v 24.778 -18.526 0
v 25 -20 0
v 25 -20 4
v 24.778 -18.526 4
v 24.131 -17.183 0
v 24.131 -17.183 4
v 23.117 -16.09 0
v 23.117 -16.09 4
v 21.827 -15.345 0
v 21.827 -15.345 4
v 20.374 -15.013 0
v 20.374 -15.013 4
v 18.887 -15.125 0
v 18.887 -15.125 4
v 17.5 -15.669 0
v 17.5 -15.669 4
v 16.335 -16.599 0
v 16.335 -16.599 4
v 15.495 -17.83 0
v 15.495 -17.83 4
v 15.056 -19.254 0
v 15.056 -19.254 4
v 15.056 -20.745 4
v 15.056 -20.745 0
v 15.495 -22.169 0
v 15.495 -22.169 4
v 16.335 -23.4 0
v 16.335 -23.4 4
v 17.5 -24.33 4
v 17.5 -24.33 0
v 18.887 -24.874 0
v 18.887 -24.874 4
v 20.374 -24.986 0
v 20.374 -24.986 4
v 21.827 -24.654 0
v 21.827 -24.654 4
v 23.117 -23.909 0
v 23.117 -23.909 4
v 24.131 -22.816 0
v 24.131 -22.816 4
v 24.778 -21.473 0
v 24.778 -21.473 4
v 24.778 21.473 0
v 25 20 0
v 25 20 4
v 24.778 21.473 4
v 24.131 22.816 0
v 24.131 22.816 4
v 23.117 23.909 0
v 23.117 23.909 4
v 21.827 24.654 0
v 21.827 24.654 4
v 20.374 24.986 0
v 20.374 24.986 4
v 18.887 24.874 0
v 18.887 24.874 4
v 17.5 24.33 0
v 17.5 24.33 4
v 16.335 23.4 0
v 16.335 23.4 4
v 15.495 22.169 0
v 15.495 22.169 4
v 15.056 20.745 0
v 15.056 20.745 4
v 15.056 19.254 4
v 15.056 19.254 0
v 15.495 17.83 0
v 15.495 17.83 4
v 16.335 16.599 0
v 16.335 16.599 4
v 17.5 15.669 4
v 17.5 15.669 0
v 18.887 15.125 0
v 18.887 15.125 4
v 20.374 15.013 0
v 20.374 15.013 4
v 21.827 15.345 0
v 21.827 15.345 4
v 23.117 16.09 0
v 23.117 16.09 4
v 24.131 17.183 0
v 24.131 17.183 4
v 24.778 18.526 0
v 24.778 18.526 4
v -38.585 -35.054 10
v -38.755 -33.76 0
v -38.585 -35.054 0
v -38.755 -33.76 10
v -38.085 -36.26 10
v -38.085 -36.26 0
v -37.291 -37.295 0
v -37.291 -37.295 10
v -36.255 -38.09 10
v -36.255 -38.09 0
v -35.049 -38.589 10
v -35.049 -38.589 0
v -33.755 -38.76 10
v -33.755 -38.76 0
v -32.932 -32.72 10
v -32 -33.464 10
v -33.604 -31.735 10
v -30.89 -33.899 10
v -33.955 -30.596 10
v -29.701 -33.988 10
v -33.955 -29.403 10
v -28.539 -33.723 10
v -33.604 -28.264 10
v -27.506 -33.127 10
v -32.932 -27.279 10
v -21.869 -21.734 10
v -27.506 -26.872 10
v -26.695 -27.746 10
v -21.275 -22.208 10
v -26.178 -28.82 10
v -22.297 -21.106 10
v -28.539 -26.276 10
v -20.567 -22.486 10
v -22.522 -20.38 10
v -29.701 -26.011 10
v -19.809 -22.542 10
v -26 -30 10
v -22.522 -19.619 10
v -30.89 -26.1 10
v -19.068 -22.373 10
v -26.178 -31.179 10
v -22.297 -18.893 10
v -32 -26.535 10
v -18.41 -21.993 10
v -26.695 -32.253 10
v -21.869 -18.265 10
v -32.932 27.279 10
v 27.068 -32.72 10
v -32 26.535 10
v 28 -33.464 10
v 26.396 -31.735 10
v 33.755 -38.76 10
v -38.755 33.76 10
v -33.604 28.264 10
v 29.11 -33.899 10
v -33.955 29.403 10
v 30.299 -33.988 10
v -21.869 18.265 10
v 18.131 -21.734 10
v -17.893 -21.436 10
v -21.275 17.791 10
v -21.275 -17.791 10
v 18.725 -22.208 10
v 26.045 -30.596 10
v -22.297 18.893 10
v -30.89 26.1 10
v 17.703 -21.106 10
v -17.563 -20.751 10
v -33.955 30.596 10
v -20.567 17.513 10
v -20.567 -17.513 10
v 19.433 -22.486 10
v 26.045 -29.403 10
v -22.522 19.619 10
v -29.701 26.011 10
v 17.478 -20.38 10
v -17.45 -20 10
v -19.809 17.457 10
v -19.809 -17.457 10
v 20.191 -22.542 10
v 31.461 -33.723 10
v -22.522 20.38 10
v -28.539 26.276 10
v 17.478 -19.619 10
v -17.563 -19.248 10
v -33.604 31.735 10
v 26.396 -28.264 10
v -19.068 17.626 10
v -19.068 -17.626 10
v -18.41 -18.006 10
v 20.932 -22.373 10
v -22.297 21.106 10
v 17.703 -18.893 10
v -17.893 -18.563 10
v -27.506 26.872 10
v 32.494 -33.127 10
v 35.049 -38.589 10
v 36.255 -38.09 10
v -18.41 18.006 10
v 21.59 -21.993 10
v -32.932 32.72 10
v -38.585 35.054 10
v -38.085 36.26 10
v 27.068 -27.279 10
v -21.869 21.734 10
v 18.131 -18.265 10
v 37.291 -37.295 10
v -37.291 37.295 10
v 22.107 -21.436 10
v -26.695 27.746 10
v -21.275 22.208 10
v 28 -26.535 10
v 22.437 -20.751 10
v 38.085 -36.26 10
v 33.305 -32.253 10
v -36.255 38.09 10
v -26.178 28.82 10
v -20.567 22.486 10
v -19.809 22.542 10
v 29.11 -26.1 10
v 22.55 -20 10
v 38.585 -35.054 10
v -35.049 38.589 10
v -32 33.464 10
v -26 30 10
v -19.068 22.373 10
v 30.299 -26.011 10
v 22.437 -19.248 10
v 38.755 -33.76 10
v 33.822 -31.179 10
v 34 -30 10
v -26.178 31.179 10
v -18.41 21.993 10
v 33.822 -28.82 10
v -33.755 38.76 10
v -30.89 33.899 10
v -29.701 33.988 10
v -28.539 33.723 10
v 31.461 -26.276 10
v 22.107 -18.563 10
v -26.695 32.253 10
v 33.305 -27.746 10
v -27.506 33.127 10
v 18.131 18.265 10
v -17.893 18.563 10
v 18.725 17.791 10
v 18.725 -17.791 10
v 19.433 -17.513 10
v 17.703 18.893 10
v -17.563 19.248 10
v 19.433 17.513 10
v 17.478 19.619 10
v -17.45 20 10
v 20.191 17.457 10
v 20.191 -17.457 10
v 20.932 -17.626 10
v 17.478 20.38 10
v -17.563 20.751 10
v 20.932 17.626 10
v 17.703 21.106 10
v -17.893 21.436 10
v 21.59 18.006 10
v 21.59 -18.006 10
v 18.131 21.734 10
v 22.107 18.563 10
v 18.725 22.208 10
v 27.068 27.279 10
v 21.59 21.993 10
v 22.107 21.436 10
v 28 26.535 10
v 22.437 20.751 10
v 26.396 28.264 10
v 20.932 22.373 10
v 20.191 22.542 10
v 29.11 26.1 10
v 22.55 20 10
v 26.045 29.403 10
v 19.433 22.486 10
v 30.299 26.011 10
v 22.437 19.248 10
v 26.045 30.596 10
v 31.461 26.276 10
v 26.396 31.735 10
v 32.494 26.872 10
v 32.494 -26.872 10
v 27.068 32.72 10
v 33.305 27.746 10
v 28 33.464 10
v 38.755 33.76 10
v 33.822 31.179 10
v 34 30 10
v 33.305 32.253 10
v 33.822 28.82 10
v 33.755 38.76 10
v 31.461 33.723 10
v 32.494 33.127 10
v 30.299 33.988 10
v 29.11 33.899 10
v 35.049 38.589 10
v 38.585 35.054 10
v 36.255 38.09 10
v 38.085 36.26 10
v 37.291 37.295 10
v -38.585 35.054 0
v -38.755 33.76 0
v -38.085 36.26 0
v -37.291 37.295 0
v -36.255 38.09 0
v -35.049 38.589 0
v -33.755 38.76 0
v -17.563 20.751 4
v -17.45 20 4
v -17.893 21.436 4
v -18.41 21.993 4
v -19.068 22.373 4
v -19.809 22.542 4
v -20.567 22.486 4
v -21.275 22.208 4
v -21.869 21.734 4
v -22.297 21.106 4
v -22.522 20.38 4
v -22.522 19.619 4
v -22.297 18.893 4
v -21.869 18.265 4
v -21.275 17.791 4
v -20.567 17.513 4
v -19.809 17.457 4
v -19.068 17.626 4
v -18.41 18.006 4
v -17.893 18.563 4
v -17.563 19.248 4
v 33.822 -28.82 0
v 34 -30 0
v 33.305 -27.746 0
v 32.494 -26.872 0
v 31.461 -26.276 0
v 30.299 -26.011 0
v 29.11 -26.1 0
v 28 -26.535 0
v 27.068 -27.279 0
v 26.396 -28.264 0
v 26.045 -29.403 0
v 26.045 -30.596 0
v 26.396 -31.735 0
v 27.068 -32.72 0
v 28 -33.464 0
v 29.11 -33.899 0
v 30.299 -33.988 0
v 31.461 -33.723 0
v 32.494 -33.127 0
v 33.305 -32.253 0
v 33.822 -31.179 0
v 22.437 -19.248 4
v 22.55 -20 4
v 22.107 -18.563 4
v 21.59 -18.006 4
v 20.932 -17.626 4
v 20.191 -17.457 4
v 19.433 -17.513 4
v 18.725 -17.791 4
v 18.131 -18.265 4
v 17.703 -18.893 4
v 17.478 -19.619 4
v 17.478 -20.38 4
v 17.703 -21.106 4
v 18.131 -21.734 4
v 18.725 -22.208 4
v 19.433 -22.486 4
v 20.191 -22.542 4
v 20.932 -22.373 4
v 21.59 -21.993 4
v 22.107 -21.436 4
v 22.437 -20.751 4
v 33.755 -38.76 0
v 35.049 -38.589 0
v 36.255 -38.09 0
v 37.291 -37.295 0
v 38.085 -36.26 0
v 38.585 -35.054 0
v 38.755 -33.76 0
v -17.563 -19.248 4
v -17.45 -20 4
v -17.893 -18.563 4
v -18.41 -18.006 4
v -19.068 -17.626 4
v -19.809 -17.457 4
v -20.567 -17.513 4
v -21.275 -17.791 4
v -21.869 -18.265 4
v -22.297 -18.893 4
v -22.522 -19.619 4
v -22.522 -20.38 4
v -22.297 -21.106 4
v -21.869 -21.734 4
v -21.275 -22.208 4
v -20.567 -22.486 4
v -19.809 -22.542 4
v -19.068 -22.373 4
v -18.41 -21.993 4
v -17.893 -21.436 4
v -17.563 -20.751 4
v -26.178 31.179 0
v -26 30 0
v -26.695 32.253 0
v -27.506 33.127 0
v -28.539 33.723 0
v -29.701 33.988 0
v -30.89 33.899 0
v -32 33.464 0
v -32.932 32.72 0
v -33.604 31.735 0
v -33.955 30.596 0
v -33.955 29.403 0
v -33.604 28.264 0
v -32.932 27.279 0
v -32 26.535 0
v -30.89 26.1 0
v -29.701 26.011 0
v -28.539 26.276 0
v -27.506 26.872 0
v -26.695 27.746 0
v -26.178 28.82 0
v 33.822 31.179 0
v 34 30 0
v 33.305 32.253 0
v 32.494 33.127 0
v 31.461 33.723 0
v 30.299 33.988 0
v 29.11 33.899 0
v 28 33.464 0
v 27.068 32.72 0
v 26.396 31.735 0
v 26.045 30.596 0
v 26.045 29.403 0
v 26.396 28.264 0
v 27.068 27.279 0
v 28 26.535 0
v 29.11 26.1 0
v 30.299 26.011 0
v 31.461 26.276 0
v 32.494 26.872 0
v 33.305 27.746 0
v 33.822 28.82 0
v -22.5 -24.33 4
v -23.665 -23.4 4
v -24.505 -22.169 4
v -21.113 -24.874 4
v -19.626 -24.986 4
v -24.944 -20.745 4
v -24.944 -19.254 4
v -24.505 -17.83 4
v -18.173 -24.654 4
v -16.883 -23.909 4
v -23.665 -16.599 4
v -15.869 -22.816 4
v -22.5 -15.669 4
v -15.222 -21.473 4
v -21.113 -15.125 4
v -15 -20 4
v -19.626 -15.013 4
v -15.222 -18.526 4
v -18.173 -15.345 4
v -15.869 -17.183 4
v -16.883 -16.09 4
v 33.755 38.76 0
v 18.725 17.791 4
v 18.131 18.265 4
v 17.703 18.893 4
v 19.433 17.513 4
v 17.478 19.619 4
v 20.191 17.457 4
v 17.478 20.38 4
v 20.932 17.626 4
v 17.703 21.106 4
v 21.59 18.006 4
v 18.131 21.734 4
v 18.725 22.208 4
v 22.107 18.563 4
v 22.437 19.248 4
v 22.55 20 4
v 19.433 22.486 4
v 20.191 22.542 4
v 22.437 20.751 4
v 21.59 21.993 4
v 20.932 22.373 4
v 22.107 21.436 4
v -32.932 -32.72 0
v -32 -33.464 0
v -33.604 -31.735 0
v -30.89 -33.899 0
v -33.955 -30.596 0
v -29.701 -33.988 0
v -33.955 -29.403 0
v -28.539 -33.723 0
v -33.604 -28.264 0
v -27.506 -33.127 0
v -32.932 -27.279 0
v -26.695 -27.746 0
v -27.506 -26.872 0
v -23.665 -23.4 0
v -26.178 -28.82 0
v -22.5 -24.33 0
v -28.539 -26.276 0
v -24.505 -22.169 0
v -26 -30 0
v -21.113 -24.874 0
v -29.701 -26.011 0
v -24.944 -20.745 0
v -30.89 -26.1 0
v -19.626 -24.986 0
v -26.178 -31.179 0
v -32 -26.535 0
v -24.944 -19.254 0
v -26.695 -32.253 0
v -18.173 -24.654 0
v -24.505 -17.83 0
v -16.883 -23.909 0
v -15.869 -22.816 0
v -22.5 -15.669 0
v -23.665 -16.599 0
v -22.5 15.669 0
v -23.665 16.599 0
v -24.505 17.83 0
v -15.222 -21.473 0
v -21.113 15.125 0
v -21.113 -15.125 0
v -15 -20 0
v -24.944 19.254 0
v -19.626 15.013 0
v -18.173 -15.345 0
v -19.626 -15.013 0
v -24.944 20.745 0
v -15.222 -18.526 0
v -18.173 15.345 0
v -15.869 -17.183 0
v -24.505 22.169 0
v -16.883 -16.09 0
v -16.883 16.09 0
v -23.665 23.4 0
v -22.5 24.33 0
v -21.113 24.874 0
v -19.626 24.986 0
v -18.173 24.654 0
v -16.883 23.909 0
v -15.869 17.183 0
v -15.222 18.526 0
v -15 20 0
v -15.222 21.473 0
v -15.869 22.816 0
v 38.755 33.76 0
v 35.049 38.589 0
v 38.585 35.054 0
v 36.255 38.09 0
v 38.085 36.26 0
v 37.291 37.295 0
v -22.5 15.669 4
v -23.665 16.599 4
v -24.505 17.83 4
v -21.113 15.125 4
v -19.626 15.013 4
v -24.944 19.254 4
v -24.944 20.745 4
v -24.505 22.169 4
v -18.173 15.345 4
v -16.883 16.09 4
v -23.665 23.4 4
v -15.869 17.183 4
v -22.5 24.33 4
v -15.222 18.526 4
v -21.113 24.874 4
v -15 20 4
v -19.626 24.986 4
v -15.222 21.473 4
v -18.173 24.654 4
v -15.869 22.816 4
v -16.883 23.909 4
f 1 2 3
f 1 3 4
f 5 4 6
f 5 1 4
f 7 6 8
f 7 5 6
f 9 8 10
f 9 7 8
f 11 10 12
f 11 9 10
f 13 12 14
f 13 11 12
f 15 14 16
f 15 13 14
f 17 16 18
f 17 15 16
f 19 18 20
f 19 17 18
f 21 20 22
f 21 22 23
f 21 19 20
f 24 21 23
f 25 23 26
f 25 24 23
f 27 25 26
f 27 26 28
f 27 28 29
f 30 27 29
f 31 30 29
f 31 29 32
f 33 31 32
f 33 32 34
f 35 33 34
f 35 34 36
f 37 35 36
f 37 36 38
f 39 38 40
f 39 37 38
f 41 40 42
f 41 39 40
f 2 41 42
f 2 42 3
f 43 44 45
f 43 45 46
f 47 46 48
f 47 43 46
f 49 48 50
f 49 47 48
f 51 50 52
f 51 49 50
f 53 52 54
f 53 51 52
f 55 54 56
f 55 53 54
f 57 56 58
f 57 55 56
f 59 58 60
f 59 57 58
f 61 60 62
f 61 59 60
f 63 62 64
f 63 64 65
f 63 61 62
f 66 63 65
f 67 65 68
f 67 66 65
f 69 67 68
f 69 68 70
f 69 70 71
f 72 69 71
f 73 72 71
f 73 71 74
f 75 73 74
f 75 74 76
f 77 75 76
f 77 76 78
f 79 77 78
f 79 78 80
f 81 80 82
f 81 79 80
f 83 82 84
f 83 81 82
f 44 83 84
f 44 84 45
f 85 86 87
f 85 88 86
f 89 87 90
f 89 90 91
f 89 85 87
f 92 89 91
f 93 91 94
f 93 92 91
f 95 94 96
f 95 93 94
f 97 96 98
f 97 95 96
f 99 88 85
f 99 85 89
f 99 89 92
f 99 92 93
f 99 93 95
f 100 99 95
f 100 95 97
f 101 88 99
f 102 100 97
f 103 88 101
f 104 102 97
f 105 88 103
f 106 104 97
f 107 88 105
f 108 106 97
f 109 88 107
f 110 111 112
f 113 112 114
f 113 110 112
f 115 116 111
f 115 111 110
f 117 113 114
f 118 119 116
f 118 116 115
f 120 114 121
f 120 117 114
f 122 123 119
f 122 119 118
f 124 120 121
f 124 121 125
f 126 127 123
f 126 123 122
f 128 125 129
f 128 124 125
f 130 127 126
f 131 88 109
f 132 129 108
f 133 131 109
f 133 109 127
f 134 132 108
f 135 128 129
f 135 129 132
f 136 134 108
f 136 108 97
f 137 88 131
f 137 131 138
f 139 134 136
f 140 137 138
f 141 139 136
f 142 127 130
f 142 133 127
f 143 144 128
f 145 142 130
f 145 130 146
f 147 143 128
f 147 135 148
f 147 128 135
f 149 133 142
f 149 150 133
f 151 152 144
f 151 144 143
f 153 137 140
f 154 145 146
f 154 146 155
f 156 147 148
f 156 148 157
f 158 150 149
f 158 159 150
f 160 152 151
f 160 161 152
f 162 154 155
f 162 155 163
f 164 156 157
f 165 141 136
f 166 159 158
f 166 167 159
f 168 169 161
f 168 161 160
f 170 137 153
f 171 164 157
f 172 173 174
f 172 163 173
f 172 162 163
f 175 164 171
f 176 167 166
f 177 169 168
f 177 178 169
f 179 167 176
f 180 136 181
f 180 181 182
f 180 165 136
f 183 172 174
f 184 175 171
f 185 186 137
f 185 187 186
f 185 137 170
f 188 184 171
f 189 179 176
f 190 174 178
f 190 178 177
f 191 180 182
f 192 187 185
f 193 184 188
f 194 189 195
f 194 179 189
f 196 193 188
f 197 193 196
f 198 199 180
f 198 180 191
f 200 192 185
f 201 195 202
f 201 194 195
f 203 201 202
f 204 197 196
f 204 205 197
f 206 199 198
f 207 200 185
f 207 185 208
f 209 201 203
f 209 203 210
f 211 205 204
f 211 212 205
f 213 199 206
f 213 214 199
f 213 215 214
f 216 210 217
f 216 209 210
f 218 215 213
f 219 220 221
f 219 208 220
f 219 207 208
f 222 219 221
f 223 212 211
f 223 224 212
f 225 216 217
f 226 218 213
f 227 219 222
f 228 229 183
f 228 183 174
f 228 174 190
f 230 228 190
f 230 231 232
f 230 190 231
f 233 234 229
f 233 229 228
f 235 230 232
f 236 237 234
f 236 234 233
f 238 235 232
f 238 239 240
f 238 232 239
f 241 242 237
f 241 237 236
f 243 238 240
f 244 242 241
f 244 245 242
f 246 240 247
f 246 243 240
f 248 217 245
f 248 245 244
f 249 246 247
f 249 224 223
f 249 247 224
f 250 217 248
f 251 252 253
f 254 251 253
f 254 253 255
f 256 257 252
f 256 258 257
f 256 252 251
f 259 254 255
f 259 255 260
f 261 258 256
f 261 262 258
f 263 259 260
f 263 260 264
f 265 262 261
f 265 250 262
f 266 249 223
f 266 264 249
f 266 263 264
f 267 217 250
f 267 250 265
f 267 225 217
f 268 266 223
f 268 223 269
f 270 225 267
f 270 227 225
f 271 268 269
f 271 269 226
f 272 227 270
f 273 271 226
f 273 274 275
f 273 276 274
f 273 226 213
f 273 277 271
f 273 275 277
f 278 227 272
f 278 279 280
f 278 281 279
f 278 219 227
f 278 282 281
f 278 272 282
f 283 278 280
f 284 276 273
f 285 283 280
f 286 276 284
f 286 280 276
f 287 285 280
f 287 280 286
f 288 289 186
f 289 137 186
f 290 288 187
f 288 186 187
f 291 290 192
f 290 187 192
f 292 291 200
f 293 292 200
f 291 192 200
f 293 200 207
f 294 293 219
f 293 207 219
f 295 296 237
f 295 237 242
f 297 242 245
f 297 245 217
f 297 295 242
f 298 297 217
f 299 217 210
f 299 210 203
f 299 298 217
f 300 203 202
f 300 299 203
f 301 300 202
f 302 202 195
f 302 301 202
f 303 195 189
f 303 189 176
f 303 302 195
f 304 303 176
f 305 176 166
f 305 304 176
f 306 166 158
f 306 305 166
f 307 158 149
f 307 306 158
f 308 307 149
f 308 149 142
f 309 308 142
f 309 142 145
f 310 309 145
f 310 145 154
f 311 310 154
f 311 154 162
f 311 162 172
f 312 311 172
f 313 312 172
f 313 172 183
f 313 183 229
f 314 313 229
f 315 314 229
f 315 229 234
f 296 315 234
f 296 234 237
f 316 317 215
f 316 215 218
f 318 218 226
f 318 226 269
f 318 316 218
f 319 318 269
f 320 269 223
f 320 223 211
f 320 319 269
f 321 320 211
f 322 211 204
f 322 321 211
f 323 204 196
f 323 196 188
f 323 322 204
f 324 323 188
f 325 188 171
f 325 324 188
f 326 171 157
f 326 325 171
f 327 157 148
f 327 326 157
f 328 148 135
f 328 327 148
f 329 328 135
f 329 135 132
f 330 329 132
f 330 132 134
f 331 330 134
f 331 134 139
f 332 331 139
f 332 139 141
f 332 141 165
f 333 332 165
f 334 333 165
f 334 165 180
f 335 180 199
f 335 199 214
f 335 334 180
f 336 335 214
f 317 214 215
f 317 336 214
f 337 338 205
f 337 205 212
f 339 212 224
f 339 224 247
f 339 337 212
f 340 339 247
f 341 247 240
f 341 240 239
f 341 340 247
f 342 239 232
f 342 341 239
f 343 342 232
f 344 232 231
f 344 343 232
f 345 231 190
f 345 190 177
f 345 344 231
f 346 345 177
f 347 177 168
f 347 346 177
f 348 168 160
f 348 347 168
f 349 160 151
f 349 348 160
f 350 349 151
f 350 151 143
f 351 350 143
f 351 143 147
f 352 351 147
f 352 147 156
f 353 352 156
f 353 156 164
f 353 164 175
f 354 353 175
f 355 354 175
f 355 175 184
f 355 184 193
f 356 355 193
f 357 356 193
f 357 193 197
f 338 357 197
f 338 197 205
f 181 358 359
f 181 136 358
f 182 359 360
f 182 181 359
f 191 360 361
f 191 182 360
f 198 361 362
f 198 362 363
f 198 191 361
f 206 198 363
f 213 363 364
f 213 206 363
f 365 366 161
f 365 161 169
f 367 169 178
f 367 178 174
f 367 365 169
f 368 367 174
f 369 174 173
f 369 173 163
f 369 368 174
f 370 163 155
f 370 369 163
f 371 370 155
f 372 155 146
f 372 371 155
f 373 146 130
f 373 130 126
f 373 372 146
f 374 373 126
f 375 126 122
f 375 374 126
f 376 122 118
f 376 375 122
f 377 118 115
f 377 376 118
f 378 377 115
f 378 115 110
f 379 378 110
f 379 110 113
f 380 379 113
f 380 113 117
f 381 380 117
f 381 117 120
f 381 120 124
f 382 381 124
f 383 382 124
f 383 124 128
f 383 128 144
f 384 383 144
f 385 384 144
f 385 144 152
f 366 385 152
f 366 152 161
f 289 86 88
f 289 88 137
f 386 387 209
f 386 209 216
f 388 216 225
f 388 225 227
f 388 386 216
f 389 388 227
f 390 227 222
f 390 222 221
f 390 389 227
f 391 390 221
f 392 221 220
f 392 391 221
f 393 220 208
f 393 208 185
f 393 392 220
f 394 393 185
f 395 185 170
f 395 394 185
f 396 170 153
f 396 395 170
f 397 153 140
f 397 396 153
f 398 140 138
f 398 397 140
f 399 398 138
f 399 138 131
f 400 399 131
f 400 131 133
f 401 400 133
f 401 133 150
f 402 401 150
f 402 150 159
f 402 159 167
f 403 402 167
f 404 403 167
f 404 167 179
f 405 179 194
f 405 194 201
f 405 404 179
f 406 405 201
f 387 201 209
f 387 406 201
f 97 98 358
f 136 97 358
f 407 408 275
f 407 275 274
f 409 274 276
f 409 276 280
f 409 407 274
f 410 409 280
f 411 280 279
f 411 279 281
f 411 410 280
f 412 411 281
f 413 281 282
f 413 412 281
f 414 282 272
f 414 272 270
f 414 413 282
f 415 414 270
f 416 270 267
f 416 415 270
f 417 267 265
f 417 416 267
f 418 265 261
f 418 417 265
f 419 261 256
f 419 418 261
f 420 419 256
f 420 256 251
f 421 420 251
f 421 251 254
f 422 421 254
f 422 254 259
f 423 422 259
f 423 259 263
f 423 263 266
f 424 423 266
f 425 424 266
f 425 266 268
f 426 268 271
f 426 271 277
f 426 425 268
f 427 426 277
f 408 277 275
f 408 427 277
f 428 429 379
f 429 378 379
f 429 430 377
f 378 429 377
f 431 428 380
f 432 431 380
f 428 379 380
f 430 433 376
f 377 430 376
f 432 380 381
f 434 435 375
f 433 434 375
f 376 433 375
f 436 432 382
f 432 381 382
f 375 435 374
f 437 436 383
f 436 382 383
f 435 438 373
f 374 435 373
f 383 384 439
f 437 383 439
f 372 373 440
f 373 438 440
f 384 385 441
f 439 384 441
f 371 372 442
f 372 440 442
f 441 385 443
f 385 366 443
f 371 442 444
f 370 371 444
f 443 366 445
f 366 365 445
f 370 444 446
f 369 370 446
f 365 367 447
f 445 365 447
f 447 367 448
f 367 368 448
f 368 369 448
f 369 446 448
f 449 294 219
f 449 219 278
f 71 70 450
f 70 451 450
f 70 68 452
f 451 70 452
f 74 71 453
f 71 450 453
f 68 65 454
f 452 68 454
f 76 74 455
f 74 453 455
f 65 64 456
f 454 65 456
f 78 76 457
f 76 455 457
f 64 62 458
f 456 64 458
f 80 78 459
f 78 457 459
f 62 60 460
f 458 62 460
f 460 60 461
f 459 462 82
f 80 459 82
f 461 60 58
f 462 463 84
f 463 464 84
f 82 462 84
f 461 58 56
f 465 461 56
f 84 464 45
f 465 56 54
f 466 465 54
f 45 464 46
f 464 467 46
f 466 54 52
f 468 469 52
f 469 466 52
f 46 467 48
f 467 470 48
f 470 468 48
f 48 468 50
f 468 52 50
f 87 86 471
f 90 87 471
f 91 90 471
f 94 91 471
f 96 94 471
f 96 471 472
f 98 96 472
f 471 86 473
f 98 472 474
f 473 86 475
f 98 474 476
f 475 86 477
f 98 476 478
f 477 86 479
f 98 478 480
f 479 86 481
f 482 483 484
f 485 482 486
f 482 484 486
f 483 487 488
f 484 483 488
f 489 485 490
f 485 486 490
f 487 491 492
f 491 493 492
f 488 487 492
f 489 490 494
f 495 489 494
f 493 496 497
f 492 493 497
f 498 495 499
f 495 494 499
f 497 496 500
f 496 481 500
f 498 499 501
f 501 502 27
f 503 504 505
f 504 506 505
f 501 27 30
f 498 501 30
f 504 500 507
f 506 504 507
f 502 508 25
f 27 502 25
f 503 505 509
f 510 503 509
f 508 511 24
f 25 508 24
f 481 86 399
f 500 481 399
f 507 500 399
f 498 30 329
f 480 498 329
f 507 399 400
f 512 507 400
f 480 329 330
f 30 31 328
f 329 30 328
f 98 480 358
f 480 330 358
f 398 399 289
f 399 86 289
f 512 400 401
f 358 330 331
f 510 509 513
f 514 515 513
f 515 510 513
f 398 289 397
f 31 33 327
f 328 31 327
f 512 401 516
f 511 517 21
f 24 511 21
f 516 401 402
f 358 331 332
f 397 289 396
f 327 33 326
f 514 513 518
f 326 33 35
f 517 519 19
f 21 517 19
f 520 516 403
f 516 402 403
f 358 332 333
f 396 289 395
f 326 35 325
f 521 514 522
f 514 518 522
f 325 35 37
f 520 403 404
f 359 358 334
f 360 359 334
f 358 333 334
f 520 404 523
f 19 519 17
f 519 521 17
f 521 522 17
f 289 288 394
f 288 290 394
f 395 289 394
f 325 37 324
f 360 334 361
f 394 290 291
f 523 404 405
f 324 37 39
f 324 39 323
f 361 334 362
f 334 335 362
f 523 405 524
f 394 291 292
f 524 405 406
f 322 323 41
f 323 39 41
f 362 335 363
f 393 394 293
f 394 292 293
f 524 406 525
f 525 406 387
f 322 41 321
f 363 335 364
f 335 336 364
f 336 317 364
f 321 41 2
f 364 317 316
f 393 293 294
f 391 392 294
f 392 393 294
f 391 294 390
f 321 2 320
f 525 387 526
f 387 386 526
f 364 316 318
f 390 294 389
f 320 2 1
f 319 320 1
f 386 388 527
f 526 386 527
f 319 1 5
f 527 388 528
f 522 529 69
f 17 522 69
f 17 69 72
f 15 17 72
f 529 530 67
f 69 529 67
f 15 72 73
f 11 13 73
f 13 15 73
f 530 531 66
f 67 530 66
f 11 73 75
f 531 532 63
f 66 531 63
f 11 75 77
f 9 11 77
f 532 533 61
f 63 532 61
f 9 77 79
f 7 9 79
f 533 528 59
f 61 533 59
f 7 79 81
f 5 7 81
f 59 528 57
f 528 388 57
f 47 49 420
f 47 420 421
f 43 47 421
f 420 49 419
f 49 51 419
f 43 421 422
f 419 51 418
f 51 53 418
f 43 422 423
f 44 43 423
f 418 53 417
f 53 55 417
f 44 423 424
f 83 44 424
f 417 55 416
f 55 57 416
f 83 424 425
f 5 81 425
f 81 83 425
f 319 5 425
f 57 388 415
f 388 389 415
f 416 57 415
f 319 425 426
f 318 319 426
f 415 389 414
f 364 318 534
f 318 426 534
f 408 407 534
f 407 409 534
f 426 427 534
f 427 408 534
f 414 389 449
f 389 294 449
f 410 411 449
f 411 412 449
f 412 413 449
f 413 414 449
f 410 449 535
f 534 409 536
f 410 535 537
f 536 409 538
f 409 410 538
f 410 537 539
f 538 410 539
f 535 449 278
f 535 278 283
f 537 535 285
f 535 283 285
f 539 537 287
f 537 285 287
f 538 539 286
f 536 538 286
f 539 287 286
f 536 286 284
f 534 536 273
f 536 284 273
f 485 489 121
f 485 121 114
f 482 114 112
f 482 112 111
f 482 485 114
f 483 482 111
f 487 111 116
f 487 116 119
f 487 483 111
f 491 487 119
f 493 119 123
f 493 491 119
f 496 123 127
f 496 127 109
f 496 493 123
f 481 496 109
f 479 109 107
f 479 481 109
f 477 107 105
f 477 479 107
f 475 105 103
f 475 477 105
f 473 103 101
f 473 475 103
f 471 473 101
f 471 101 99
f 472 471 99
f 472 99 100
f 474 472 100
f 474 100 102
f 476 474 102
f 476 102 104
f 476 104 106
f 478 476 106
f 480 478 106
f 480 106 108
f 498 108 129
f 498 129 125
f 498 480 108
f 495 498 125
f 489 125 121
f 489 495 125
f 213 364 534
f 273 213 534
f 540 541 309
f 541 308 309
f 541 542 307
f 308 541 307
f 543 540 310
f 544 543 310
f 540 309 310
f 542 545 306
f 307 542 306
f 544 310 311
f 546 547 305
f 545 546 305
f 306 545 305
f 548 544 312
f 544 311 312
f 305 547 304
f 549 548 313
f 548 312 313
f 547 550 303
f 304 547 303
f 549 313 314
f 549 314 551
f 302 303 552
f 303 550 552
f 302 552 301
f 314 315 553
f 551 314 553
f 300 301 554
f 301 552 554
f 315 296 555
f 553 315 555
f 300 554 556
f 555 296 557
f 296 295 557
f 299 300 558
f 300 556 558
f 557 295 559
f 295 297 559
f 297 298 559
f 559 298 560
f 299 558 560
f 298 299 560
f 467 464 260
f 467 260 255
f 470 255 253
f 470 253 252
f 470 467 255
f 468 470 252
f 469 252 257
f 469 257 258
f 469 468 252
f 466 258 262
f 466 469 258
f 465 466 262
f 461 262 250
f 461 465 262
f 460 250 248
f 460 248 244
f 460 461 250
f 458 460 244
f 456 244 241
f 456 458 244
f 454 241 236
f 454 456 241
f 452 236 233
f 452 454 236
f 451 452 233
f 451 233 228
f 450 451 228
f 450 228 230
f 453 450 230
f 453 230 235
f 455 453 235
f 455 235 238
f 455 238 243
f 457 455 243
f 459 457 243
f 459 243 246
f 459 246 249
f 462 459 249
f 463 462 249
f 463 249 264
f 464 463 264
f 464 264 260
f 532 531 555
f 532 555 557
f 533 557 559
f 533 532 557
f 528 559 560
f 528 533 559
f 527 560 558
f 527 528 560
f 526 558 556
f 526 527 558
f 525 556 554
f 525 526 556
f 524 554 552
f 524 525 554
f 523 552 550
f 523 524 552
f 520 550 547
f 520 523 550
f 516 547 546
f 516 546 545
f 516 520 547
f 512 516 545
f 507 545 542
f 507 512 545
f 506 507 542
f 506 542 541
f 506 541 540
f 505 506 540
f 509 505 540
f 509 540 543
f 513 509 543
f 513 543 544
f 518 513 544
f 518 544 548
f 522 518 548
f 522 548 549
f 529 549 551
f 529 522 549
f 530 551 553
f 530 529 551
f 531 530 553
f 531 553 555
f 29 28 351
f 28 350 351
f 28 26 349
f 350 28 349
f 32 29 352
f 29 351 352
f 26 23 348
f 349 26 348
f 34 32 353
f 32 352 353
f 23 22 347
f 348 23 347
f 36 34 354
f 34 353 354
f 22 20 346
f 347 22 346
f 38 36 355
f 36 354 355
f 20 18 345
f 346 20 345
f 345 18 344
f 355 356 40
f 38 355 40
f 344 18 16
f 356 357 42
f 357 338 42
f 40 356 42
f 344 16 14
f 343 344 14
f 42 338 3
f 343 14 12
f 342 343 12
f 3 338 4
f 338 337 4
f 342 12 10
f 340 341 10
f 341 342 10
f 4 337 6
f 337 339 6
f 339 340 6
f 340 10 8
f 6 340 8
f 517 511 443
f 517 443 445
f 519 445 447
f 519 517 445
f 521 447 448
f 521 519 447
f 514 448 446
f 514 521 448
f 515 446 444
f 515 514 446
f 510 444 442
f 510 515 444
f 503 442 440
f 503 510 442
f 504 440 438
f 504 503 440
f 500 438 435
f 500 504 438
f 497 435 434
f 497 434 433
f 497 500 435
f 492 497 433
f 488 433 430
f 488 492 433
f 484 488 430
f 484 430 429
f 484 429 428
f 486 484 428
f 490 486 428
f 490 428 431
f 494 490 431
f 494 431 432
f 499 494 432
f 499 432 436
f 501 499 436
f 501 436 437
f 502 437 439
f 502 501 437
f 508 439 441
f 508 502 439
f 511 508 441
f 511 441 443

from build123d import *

# Parameters (mm, degrees)
F0_W     = 77.51
F0_H     = 77.519
F0_R     = 4
F0_R_2   = 5
F0_R_3   = 2.55
F1_DEPTH = 10
F2_R     = 5
F3_DEPTH = 4


# Not quite as in the source:
# - a feature names something its author has since deleted; it is built from what else it names


with BuildPart() as f1:
    # F0 (on Top) → F1 (new body)
    with BuildSketch(Plane.XY):
        Rectangle(F0_W, F0_H)
        with Locations((-30, -29.9995)):
            Circle(F0_R, mode=Mode.SUBTRACT)
        with Locations((-20, -19.9995)):
            Circle(F0_R_2, mode=Mode.SUBTRACT)
        with Locations((30, -29.9995)):
            Circle(F0_R, mode=Mode.SUBTRACT)
        with Locations((20, -19.9995)):
            Circle(F0_R_2, mode=Mode.SUBTRACT)
        with Locations((-20, 19.9995)):
            Circle(F0_R_2, mode=Mode.SUBTRACT)
        with Locations((-30, 29.9995)):
            Circle(F0_R, mode=Mode.SUBTRACT)
        with Locations((20, 19.9995)):
            Circle(F0_R_2, mode=Mode.SUBTRACT)
        with Locations((30, 29.9995)):
            Circle(F0_R, mode=Mode.SUBTRACT)
        with Locations((-20, 19.9995)):
            Circle(F0_R_2)
        with Locations((-20, 19.9995)):
            Circle(F0_R_3, mode=Mode.SUBTRACT)
        with Locations((20, 19.9995)):
            Circle(F0_R_2)
        with Locations((20, 19.9995)):
            Circle(F0_R_3, mode=Mode.SUBTRACT)
        with Locations((20, -19.9995)):
            Circle(F0_R_2)
        with Locations((20, -19.9995)):
            Circle(F0_R_3, mode=Mode.SUBTRACT)
        with Locations((-20, -19.9995)):
            Circle(F0_R_2)
        with Locations((-20, -19.9995)):
            Circle(F0_R_3, mode=Mode.SUBTRACT)
    extrude(amount=F1_DEPTH)

    # F2
    f2_edges = [f1.edges().sort_by_distance(p)[0] for p in [
        (38.755, -38.7595, 5),
        (-38.755, -38.7595, 5),
        (38.755, 38.7595, 5),
        (-38.755, 38.7595, 5),
    ]]
    fillet(f2_edges, radius=F2_R)

    # F0 (on Top) → F3 (cut)
    with BuildSketch(Plane.XY):
        with Locations((-20, 19.9995)):
            Circle(F0_R_2)
        with Locations((-20, 19.9995)):
            Circle(F0_R_3, mode=Mode.SUBTRACT)
        with Locations((20, 19.9995)):
            Circle(F0_R_2)
        with Locations((20, 19.9995)):
            Circle(F0_R_3, mode=Mode.SUBTRACT)
        with Locations((-20, -19.9995)):
            Circle(F0_R_2)
        with Locations((-20, -19.9995)):
            Circle(F0_R_3, mode=Mode.SUBTRACT)
        with Locations((20, -19.9995)):
            Circle(F0_R_2)
        with Locations((20, -19.9995)):
            Circle(F0_R_3, mode=Mode.SUBTRACT)
    extrude(amount=F3_DEPTH, mode=Mode.SUBTRACT)


solid = f1.part
